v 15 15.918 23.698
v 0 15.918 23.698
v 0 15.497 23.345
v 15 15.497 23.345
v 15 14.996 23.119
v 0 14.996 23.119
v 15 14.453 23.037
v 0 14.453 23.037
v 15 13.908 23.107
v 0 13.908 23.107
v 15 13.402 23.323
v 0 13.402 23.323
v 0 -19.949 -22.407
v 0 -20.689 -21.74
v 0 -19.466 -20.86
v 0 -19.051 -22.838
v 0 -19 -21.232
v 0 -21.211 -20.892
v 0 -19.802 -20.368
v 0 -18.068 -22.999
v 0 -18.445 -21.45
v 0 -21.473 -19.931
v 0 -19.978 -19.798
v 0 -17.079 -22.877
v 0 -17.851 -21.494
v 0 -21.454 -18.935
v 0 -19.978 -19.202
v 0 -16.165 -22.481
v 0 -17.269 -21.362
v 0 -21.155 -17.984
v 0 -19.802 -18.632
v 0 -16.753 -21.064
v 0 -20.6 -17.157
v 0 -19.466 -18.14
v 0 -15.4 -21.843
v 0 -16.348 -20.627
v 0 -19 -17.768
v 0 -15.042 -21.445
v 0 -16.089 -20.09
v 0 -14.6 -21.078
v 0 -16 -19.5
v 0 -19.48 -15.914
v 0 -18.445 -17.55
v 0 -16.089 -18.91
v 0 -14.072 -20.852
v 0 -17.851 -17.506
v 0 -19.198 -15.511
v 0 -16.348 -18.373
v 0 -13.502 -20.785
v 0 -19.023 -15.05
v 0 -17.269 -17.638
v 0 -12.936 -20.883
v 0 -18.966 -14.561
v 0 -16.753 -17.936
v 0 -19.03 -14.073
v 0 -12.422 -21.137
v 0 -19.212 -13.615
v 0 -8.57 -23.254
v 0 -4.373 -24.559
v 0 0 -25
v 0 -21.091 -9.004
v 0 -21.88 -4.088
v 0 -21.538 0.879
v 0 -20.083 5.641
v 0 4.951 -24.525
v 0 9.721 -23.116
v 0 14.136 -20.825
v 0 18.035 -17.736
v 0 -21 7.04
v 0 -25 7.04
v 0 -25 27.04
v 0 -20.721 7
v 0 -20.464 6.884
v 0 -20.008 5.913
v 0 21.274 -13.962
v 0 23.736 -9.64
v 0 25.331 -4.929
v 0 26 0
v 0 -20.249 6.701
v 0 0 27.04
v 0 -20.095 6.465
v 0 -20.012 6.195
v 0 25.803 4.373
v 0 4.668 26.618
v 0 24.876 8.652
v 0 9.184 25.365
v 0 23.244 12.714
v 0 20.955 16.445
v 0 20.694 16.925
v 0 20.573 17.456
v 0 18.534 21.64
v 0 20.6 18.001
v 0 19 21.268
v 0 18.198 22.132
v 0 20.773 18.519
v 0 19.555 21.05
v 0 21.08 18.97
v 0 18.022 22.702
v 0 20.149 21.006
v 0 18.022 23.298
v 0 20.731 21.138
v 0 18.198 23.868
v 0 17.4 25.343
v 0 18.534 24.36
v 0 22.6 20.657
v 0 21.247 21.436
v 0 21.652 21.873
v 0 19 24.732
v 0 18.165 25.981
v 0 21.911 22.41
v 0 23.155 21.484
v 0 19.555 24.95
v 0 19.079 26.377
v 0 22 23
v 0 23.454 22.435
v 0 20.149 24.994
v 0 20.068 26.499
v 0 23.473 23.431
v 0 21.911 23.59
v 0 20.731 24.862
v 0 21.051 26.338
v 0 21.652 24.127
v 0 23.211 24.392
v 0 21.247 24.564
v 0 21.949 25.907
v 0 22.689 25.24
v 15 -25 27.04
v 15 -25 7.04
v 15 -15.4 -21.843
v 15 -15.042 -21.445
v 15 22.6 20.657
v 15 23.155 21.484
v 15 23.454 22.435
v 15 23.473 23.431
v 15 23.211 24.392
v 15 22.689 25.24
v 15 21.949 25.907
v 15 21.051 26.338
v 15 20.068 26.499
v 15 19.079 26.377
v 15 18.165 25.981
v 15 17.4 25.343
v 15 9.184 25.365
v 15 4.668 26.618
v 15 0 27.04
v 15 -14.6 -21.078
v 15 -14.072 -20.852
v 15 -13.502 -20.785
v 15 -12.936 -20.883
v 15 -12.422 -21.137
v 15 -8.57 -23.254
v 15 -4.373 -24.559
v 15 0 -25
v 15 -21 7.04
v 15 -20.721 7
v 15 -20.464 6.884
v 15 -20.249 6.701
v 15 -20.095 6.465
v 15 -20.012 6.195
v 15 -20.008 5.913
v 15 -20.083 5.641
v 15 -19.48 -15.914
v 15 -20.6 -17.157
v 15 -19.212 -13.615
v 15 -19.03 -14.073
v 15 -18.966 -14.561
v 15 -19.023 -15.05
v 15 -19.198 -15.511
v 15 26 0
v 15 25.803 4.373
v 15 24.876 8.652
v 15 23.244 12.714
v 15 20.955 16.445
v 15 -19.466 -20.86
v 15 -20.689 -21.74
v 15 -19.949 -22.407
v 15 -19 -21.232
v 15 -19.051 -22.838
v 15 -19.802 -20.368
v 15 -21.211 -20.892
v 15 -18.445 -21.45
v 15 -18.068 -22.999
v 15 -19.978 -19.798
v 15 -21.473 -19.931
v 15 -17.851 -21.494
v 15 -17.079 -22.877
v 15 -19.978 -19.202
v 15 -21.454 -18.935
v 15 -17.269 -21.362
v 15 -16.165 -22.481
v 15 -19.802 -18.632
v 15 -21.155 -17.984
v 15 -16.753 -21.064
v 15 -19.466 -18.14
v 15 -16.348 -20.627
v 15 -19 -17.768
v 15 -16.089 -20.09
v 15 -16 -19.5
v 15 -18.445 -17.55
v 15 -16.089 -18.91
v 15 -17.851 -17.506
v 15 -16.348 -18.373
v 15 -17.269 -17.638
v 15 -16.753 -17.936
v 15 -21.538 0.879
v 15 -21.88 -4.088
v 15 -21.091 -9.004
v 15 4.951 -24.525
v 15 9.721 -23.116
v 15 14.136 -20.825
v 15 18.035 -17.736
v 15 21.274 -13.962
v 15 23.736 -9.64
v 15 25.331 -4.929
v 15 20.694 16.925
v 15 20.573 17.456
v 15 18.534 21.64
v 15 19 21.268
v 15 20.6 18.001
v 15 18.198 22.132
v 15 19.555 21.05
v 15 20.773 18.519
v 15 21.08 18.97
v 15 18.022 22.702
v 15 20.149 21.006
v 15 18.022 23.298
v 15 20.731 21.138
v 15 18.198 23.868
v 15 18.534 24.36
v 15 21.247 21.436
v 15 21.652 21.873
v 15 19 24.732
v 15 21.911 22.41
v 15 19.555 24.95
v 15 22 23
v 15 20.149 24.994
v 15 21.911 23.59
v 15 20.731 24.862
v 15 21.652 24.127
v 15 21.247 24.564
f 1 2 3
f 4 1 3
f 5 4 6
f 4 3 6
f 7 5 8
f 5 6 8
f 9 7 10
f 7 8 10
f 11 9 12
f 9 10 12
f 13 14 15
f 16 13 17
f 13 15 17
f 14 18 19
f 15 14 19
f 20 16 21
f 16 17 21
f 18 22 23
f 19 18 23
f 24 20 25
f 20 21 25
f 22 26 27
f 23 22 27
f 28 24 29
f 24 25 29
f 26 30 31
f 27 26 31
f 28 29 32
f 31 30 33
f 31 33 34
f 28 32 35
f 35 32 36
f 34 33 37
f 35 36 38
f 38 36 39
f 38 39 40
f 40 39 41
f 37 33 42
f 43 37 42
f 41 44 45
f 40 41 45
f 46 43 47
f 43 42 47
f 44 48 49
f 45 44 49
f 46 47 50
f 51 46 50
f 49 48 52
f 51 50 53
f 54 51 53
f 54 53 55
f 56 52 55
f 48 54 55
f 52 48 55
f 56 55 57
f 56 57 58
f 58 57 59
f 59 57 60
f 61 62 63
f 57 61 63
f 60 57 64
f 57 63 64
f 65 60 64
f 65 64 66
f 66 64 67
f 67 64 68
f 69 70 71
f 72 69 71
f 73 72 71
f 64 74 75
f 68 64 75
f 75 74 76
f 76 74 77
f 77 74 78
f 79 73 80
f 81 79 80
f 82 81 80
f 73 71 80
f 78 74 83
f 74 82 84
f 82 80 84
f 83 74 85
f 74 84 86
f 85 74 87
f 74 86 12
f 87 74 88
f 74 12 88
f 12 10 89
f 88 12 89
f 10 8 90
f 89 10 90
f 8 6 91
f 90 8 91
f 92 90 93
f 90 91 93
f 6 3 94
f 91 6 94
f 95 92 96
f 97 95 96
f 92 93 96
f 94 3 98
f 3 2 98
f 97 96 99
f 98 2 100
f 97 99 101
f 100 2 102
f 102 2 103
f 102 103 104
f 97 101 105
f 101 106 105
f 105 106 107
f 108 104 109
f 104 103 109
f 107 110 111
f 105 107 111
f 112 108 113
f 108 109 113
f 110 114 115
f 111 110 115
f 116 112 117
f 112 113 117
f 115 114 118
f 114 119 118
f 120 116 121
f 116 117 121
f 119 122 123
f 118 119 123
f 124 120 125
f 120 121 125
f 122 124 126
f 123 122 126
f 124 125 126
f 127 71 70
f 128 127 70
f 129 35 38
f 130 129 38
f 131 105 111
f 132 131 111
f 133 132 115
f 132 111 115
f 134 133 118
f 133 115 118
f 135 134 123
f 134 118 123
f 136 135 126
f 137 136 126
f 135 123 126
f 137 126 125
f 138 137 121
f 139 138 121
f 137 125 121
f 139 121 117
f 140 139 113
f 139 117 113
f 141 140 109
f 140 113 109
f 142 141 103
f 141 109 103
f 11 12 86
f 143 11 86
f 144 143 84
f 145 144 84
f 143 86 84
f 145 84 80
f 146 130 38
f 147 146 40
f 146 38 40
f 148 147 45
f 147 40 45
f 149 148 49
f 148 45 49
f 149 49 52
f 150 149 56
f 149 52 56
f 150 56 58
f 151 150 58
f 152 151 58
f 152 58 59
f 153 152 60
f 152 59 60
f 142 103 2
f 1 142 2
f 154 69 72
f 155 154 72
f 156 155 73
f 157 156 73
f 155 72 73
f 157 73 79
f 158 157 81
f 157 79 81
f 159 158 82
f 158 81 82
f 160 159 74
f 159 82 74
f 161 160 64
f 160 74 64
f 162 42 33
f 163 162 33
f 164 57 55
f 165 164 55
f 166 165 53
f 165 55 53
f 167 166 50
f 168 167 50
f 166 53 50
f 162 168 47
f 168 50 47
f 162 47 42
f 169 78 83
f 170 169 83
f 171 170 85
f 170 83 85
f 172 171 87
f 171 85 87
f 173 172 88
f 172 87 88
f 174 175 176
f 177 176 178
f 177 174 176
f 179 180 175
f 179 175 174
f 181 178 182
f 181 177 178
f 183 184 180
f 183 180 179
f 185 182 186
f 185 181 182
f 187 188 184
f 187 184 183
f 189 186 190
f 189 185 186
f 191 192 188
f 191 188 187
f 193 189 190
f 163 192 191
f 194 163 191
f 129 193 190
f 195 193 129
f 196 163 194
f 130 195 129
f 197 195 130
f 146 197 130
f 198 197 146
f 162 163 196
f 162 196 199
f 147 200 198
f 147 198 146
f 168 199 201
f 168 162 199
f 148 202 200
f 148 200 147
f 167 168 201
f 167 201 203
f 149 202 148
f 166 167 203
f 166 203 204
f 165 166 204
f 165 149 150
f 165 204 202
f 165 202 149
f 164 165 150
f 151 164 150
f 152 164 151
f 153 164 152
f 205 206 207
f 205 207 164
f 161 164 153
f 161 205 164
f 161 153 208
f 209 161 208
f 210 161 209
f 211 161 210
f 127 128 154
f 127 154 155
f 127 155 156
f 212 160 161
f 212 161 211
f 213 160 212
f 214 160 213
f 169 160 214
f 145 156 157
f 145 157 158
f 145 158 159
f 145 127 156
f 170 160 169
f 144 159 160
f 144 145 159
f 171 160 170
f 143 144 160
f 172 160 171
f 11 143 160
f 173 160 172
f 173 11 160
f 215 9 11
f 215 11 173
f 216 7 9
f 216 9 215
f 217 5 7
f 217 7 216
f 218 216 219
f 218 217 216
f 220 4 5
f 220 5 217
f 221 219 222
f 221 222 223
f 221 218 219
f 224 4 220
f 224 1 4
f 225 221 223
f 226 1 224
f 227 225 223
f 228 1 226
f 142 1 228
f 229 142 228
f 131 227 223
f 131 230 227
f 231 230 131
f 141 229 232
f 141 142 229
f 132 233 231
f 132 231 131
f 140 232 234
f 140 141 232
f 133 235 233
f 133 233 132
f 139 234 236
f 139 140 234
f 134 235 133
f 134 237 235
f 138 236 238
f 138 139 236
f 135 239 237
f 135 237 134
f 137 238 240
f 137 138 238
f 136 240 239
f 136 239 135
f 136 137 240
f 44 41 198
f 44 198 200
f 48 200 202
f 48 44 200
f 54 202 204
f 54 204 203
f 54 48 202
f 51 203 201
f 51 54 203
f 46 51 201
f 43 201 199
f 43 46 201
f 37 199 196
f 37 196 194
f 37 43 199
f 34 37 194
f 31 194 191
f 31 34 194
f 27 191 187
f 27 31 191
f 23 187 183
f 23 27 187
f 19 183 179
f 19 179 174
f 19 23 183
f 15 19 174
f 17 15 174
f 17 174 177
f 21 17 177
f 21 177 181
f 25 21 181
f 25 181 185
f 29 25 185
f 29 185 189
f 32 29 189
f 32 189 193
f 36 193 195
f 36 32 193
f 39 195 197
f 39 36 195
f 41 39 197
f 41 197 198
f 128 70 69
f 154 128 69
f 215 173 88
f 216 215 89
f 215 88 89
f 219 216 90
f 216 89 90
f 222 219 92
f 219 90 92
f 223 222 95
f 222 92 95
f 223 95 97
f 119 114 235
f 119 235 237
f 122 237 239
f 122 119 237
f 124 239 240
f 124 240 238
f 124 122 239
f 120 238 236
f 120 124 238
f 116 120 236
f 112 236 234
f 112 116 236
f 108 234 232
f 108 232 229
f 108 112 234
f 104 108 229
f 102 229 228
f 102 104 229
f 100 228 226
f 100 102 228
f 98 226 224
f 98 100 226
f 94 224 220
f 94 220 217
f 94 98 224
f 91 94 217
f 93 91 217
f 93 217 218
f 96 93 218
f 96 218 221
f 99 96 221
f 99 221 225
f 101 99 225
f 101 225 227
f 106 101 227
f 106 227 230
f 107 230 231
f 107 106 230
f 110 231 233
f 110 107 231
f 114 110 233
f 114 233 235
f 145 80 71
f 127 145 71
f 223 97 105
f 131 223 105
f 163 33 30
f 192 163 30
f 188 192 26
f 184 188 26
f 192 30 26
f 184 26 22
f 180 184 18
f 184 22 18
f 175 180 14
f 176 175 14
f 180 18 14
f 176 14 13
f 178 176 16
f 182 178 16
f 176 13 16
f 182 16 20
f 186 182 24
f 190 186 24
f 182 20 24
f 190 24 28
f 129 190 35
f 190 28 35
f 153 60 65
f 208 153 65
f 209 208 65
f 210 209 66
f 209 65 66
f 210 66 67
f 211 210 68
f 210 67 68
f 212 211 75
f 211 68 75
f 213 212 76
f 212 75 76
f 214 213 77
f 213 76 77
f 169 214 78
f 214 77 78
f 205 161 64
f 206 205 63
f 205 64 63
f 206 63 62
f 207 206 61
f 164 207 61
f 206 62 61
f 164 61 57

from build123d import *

# Parameters (mm, degrees)
F0_R     = 2
F0_R_2   = 16
F0_R_3   = 12
F1_DEPTH = 15


with BuildPart() as f1:
    # F0 (on Right) → F1 (new body)
    with BuildSketch(Plane.YZ):
        with BuildLine():
            Line((0, 27.04), (-25, 27.04))
            Line((-25, 27.04), (-25, 7.04))
            Line((-25, 7.04), (-21, 7.04))
            ThreePointArc((-21, 7.04), (-20.163638, 6.588177), (-20.08305, 5.640997))
            ThreePointArc((-20.08305, 5.640997), (-21.879632, -4.088083), (-19.211664, -13.615132))
            ThreePointArc((-19.211664, -13.615132), (-18.979502, -14.807582), (-19.480274, -15.914409))
            Line((-19.480274, -15.914409), (-20.600008, -17.156934))
            ThreePointArc((-20.600008, -17.156934), (-20.343066, -22.100008), (-15.399992, -21.843066))
            Line((-15.399992, -21.843066), (-15.041526, -21.44529))
            ThreePointArc((-15.041526, -21.44529), (-13.789573, -20.797894), (-12.421526, -21.136943))
            ThreePointArc((-12.421526, -21.136943), (-6.504182, -24.011949), (0, -25))
            ThreePointArc((0, -25), (18.034689, -17.736076), (26, 0))
            ThreePointArc((26, 0), (24.875659, 8.651645), (20.954714, 16.445315))
            ThreePointArc((20.954714, 16.445315), (20.567821, 17.729828), (21.079657, 18.969861))
            Line((21.079657, 18.969861), (22.600008, 20.656934))
            ThreePointArc((22.600008, 20.656934), (22.343066, 25.600008), (17.399992, 25.343066))
            Line((17.399992, 25.343066), (15.917898, 23.698445))
            ThreePointArc((15.917898, 23.698445), (14.727343, 23.05924), (13.402045, 23.32304))
            ThreePointArc((13.402045, 23.32304), (6.953967, 26.093547), (0, 27.04))
        make_face()
        with Locations((-18, -19.5)):
            Circle(F0_R, mode=Mode.SUBTRACT)
        Circle(F0_R_2, mode=Mode.SUBTRACT)
        with Locations((20, 23)):
            Circle(F0_R, mode=Mode.SUBTRACT)
        Circle(F0_R_2)
        Circle(F0_R_3, mode=Mode.SUBTRACT)
        Circle(F0_R_3)
    extrude(amount=F1_DEPTH)


solid = f1.part
